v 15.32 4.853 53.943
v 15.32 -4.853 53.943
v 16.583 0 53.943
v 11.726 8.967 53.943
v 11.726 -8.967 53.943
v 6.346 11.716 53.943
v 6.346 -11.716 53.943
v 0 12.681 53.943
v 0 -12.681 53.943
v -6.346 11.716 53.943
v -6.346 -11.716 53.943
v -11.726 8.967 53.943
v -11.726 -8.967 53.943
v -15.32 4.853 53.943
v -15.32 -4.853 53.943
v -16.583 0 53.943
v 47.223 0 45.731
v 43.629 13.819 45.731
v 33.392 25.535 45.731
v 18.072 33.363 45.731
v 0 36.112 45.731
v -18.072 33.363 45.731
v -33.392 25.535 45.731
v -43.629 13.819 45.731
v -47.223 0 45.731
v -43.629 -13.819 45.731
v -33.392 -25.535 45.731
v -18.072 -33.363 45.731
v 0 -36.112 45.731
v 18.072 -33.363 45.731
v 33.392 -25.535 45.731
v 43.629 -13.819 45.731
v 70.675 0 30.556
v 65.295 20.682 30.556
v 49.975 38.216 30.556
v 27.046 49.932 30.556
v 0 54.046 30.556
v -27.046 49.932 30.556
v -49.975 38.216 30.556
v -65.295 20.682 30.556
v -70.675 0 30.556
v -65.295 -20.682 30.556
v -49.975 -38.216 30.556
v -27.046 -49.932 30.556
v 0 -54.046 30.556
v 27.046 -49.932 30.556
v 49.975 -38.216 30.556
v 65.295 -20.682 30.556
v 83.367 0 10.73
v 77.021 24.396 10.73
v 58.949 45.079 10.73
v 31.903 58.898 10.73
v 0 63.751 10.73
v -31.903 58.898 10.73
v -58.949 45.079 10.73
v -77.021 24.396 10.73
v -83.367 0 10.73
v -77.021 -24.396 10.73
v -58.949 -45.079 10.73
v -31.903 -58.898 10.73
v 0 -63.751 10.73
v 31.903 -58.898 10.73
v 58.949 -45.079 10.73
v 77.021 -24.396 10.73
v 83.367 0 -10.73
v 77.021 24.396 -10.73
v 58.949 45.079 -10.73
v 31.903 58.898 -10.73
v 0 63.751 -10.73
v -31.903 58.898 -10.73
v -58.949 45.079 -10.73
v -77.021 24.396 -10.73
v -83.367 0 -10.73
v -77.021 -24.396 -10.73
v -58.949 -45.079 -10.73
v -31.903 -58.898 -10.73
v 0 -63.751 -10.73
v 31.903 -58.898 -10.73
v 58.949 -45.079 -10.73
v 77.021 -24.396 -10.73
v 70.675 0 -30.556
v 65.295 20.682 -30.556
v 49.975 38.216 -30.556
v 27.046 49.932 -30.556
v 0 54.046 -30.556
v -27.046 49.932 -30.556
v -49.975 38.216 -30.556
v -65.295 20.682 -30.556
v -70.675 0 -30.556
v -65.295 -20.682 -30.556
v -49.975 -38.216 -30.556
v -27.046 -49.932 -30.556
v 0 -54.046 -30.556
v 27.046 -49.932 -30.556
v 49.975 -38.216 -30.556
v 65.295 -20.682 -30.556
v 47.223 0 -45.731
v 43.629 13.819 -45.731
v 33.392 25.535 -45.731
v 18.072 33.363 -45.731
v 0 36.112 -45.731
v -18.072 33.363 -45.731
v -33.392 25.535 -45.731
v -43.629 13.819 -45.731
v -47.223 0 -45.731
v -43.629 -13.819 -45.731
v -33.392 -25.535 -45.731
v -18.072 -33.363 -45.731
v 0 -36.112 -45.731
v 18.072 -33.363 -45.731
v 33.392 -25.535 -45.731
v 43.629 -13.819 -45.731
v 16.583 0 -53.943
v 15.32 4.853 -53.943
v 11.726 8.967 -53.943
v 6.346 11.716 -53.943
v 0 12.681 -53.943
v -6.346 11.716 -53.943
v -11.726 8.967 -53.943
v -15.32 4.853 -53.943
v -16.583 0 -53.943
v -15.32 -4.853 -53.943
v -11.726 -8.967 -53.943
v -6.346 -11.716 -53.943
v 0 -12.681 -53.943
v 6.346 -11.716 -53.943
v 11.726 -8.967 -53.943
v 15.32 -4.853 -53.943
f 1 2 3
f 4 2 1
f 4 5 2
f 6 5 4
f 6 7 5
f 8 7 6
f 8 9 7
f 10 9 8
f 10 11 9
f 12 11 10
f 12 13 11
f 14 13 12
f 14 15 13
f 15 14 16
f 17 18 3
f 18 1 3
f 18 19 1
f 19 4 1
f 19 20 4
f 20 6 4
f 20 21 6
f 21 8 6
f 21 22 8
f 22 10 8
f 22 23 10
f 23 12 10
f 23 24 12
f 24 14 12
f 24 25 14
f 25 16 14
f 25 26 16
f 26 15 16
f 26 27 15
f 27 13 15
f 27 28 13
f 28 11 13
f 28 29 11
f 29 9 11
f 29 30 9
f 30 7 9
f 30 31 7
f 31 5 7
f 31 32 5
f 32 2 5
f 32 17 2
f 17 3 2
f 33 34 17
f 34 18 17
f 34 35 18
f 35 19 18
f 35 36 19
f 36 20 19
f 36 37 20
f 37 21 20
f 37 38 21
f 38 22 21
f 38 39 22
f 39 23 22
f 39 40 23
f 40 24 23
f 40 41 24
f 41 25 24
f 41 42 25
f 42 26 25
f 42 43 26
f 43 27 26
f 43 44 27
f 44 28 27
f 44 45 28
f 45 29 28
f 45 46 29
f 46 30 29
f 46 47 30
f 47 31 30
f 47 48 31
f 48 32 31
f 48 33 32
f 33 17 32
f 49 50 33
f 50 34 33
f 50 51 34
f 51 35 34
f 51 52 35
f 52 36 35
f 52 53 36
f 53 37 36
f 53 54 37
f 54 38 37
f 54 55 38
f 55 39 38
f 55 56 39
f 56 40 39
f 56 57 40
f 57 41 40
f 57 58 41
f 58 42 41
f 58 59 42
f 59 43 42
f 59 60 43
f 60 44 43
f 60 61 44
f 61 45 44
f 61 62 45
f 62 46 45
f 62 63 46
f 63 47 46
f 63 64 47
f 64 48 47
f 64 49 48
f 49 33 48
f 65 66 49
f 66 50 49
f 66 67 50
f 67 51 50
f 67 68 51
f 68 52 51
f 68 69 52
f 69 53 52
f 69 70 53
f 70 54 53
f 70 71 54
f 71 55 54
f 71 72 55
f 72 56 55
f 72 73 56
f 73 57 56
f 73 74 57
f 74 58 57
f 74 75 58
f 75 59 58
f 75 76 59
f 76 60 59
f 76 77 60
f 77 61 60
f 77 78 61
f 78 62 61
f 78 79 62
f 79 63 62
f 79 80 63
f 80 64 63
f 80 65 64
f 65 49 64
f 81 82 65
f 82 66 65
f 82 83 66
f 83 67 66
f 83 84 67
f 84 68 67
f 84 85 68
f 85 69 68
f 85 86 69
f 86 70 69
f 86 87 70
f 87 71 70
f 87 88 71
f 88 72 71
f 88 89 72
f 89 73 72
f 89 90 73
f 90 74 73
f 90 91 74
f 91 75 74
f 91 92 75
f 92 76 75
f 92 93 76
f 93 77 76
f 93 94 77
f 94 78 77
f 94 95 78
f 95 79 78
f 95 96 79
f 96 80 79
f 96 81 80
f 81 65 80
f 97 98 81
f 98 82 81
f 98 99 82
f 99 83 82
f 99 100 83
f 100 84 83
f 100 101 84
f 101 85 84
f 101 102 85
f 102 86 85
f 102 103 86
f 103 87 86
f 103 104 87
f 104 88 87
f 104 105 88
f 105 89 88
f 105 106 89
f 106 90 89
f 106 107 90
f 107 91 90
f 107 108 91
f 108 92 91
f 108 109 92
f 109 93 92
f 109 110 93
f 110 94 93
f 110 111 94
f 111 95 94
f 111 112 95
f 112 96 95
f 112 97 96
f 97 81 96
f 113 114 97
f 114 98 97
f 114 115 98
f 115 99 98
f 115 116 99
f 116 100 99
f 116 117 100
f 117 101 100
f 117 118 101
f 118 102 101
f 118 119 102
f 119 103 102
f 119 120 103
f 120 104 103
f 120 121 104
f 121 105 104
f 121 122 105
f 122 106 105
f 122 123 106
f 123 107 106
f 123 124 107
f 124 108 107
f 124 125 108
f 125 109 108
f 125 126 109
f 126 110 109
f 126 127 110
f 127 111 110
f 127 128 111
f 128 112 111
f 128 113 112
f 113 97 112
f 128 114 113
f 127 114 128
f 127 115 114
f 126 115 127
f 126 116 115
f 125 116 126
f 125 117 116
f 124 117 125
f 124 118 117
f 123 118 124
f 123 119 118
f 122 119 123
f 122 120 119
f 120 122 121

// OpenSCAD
// Generated by SolidPython 1.0.1 on 2020-07-29 00:46:53


scale(v = [17, 13, 11]) {
	sphere(r = 5);
}
/***********************************************
*********      SolidPython code:      **********
************************************************
 
# import packages: SolidPython
from solid import *
from solid.utils import *
from itertools import chain, combinations, permutations


class Resize:

    def __init__(self, scad_file):
        self.scad_file = scad_file
        #self.scad_file = import_scad(scad_file)
        # cone/cylinder param:
        self.r1 = 0
        self.r2 = 0
        self.h = 0
        # rectangular prism param:
        self.w = 0
        self.l = 0
        # ellipse param:
        self.r = 0

    # import OpenScad code (file name corresponds to shape)


    # classify shape + parameters
    def assign(self, param1, param2, param3):
        if self.scad_file == 'cone.scad':
            self.r1 = param1
            self.r2 = param2
            self.h = param3
        elif self.scad_file == 'cylinder.scad':
            self.r1 = param1
            self.r2 = param2
            self.h = param3
        elif self.scad_file == 'rectangularPrism.scad':
            self.h = param1
            self.l = param2
            self.w = param3
        else:
            self.r = param1
            self.h = param2

    # resize parameters
    def iterate(self):
        x = range(3, 20, 2)
        i = 1
        if self.scad_file == 'cone.scad':
            tempList = list(permutations(x, 2))
            for temp in tempList:
                param1 = temp[0]
                param2 = temp[1]
                filepath = 'produced_scad_files/' + 'cone' + str(param1) + '_' + str(param2) + '_' + '.scad'
                scad_render_to_file(cylinder(h=param1, r1=param2, r2=0), filepath)

        elif self.scad_file == 'cylinder.scad':
            tempList = list(permutations(x, 3))
            for temp in tempList:
                param1 = temp[0]
                param2 = temp[1]
                filepath = 'produced_scad_files/' + 'cylinder' + str(param1) + '_' + str(param2) + '_' + '.scad'
                scad_render_to_file(cylinder(h=param1, r1=param2, r2=param2), filepath)

        elif self.scad_file == 'rectangularPrism.scad':
            tempList = list(permutations(x, 3))
            for temp in tempList:
                param1 = temp[0]
                param2 = temp[1]
                param3 = temp[2]
                filepath = 'produced_scad_files/' + 'rectangularPrism' + str(param1) + '_' + str(param2) + '_' + str(
                    param3) + '.scad'
                scad_render_to_file(cube(size=(param1, param2, param3)), filepath)

        elif self.scad_file == 'ellipse.scad':
            tempList = list(permutations(x, 4))
            for temp in tempList:
                param1 = temp[0]
                param2 = temp[1]
                param3 = temp[2]
                param4 = temp[3]
                filepath = 'produced_scad_files/' + 'ellipse' + str(param1) + '_' + str(param2) + '_' + str(param3) + '_' + str(param4) + '.scad'
                scad_render_to_file(scale([param1, param2, param3])(sphere(r=param4)), filepath)

    def render_to_scadfile(self):
        scad_render_to_file(scad, 'example.scad') 
 
************************************************/
